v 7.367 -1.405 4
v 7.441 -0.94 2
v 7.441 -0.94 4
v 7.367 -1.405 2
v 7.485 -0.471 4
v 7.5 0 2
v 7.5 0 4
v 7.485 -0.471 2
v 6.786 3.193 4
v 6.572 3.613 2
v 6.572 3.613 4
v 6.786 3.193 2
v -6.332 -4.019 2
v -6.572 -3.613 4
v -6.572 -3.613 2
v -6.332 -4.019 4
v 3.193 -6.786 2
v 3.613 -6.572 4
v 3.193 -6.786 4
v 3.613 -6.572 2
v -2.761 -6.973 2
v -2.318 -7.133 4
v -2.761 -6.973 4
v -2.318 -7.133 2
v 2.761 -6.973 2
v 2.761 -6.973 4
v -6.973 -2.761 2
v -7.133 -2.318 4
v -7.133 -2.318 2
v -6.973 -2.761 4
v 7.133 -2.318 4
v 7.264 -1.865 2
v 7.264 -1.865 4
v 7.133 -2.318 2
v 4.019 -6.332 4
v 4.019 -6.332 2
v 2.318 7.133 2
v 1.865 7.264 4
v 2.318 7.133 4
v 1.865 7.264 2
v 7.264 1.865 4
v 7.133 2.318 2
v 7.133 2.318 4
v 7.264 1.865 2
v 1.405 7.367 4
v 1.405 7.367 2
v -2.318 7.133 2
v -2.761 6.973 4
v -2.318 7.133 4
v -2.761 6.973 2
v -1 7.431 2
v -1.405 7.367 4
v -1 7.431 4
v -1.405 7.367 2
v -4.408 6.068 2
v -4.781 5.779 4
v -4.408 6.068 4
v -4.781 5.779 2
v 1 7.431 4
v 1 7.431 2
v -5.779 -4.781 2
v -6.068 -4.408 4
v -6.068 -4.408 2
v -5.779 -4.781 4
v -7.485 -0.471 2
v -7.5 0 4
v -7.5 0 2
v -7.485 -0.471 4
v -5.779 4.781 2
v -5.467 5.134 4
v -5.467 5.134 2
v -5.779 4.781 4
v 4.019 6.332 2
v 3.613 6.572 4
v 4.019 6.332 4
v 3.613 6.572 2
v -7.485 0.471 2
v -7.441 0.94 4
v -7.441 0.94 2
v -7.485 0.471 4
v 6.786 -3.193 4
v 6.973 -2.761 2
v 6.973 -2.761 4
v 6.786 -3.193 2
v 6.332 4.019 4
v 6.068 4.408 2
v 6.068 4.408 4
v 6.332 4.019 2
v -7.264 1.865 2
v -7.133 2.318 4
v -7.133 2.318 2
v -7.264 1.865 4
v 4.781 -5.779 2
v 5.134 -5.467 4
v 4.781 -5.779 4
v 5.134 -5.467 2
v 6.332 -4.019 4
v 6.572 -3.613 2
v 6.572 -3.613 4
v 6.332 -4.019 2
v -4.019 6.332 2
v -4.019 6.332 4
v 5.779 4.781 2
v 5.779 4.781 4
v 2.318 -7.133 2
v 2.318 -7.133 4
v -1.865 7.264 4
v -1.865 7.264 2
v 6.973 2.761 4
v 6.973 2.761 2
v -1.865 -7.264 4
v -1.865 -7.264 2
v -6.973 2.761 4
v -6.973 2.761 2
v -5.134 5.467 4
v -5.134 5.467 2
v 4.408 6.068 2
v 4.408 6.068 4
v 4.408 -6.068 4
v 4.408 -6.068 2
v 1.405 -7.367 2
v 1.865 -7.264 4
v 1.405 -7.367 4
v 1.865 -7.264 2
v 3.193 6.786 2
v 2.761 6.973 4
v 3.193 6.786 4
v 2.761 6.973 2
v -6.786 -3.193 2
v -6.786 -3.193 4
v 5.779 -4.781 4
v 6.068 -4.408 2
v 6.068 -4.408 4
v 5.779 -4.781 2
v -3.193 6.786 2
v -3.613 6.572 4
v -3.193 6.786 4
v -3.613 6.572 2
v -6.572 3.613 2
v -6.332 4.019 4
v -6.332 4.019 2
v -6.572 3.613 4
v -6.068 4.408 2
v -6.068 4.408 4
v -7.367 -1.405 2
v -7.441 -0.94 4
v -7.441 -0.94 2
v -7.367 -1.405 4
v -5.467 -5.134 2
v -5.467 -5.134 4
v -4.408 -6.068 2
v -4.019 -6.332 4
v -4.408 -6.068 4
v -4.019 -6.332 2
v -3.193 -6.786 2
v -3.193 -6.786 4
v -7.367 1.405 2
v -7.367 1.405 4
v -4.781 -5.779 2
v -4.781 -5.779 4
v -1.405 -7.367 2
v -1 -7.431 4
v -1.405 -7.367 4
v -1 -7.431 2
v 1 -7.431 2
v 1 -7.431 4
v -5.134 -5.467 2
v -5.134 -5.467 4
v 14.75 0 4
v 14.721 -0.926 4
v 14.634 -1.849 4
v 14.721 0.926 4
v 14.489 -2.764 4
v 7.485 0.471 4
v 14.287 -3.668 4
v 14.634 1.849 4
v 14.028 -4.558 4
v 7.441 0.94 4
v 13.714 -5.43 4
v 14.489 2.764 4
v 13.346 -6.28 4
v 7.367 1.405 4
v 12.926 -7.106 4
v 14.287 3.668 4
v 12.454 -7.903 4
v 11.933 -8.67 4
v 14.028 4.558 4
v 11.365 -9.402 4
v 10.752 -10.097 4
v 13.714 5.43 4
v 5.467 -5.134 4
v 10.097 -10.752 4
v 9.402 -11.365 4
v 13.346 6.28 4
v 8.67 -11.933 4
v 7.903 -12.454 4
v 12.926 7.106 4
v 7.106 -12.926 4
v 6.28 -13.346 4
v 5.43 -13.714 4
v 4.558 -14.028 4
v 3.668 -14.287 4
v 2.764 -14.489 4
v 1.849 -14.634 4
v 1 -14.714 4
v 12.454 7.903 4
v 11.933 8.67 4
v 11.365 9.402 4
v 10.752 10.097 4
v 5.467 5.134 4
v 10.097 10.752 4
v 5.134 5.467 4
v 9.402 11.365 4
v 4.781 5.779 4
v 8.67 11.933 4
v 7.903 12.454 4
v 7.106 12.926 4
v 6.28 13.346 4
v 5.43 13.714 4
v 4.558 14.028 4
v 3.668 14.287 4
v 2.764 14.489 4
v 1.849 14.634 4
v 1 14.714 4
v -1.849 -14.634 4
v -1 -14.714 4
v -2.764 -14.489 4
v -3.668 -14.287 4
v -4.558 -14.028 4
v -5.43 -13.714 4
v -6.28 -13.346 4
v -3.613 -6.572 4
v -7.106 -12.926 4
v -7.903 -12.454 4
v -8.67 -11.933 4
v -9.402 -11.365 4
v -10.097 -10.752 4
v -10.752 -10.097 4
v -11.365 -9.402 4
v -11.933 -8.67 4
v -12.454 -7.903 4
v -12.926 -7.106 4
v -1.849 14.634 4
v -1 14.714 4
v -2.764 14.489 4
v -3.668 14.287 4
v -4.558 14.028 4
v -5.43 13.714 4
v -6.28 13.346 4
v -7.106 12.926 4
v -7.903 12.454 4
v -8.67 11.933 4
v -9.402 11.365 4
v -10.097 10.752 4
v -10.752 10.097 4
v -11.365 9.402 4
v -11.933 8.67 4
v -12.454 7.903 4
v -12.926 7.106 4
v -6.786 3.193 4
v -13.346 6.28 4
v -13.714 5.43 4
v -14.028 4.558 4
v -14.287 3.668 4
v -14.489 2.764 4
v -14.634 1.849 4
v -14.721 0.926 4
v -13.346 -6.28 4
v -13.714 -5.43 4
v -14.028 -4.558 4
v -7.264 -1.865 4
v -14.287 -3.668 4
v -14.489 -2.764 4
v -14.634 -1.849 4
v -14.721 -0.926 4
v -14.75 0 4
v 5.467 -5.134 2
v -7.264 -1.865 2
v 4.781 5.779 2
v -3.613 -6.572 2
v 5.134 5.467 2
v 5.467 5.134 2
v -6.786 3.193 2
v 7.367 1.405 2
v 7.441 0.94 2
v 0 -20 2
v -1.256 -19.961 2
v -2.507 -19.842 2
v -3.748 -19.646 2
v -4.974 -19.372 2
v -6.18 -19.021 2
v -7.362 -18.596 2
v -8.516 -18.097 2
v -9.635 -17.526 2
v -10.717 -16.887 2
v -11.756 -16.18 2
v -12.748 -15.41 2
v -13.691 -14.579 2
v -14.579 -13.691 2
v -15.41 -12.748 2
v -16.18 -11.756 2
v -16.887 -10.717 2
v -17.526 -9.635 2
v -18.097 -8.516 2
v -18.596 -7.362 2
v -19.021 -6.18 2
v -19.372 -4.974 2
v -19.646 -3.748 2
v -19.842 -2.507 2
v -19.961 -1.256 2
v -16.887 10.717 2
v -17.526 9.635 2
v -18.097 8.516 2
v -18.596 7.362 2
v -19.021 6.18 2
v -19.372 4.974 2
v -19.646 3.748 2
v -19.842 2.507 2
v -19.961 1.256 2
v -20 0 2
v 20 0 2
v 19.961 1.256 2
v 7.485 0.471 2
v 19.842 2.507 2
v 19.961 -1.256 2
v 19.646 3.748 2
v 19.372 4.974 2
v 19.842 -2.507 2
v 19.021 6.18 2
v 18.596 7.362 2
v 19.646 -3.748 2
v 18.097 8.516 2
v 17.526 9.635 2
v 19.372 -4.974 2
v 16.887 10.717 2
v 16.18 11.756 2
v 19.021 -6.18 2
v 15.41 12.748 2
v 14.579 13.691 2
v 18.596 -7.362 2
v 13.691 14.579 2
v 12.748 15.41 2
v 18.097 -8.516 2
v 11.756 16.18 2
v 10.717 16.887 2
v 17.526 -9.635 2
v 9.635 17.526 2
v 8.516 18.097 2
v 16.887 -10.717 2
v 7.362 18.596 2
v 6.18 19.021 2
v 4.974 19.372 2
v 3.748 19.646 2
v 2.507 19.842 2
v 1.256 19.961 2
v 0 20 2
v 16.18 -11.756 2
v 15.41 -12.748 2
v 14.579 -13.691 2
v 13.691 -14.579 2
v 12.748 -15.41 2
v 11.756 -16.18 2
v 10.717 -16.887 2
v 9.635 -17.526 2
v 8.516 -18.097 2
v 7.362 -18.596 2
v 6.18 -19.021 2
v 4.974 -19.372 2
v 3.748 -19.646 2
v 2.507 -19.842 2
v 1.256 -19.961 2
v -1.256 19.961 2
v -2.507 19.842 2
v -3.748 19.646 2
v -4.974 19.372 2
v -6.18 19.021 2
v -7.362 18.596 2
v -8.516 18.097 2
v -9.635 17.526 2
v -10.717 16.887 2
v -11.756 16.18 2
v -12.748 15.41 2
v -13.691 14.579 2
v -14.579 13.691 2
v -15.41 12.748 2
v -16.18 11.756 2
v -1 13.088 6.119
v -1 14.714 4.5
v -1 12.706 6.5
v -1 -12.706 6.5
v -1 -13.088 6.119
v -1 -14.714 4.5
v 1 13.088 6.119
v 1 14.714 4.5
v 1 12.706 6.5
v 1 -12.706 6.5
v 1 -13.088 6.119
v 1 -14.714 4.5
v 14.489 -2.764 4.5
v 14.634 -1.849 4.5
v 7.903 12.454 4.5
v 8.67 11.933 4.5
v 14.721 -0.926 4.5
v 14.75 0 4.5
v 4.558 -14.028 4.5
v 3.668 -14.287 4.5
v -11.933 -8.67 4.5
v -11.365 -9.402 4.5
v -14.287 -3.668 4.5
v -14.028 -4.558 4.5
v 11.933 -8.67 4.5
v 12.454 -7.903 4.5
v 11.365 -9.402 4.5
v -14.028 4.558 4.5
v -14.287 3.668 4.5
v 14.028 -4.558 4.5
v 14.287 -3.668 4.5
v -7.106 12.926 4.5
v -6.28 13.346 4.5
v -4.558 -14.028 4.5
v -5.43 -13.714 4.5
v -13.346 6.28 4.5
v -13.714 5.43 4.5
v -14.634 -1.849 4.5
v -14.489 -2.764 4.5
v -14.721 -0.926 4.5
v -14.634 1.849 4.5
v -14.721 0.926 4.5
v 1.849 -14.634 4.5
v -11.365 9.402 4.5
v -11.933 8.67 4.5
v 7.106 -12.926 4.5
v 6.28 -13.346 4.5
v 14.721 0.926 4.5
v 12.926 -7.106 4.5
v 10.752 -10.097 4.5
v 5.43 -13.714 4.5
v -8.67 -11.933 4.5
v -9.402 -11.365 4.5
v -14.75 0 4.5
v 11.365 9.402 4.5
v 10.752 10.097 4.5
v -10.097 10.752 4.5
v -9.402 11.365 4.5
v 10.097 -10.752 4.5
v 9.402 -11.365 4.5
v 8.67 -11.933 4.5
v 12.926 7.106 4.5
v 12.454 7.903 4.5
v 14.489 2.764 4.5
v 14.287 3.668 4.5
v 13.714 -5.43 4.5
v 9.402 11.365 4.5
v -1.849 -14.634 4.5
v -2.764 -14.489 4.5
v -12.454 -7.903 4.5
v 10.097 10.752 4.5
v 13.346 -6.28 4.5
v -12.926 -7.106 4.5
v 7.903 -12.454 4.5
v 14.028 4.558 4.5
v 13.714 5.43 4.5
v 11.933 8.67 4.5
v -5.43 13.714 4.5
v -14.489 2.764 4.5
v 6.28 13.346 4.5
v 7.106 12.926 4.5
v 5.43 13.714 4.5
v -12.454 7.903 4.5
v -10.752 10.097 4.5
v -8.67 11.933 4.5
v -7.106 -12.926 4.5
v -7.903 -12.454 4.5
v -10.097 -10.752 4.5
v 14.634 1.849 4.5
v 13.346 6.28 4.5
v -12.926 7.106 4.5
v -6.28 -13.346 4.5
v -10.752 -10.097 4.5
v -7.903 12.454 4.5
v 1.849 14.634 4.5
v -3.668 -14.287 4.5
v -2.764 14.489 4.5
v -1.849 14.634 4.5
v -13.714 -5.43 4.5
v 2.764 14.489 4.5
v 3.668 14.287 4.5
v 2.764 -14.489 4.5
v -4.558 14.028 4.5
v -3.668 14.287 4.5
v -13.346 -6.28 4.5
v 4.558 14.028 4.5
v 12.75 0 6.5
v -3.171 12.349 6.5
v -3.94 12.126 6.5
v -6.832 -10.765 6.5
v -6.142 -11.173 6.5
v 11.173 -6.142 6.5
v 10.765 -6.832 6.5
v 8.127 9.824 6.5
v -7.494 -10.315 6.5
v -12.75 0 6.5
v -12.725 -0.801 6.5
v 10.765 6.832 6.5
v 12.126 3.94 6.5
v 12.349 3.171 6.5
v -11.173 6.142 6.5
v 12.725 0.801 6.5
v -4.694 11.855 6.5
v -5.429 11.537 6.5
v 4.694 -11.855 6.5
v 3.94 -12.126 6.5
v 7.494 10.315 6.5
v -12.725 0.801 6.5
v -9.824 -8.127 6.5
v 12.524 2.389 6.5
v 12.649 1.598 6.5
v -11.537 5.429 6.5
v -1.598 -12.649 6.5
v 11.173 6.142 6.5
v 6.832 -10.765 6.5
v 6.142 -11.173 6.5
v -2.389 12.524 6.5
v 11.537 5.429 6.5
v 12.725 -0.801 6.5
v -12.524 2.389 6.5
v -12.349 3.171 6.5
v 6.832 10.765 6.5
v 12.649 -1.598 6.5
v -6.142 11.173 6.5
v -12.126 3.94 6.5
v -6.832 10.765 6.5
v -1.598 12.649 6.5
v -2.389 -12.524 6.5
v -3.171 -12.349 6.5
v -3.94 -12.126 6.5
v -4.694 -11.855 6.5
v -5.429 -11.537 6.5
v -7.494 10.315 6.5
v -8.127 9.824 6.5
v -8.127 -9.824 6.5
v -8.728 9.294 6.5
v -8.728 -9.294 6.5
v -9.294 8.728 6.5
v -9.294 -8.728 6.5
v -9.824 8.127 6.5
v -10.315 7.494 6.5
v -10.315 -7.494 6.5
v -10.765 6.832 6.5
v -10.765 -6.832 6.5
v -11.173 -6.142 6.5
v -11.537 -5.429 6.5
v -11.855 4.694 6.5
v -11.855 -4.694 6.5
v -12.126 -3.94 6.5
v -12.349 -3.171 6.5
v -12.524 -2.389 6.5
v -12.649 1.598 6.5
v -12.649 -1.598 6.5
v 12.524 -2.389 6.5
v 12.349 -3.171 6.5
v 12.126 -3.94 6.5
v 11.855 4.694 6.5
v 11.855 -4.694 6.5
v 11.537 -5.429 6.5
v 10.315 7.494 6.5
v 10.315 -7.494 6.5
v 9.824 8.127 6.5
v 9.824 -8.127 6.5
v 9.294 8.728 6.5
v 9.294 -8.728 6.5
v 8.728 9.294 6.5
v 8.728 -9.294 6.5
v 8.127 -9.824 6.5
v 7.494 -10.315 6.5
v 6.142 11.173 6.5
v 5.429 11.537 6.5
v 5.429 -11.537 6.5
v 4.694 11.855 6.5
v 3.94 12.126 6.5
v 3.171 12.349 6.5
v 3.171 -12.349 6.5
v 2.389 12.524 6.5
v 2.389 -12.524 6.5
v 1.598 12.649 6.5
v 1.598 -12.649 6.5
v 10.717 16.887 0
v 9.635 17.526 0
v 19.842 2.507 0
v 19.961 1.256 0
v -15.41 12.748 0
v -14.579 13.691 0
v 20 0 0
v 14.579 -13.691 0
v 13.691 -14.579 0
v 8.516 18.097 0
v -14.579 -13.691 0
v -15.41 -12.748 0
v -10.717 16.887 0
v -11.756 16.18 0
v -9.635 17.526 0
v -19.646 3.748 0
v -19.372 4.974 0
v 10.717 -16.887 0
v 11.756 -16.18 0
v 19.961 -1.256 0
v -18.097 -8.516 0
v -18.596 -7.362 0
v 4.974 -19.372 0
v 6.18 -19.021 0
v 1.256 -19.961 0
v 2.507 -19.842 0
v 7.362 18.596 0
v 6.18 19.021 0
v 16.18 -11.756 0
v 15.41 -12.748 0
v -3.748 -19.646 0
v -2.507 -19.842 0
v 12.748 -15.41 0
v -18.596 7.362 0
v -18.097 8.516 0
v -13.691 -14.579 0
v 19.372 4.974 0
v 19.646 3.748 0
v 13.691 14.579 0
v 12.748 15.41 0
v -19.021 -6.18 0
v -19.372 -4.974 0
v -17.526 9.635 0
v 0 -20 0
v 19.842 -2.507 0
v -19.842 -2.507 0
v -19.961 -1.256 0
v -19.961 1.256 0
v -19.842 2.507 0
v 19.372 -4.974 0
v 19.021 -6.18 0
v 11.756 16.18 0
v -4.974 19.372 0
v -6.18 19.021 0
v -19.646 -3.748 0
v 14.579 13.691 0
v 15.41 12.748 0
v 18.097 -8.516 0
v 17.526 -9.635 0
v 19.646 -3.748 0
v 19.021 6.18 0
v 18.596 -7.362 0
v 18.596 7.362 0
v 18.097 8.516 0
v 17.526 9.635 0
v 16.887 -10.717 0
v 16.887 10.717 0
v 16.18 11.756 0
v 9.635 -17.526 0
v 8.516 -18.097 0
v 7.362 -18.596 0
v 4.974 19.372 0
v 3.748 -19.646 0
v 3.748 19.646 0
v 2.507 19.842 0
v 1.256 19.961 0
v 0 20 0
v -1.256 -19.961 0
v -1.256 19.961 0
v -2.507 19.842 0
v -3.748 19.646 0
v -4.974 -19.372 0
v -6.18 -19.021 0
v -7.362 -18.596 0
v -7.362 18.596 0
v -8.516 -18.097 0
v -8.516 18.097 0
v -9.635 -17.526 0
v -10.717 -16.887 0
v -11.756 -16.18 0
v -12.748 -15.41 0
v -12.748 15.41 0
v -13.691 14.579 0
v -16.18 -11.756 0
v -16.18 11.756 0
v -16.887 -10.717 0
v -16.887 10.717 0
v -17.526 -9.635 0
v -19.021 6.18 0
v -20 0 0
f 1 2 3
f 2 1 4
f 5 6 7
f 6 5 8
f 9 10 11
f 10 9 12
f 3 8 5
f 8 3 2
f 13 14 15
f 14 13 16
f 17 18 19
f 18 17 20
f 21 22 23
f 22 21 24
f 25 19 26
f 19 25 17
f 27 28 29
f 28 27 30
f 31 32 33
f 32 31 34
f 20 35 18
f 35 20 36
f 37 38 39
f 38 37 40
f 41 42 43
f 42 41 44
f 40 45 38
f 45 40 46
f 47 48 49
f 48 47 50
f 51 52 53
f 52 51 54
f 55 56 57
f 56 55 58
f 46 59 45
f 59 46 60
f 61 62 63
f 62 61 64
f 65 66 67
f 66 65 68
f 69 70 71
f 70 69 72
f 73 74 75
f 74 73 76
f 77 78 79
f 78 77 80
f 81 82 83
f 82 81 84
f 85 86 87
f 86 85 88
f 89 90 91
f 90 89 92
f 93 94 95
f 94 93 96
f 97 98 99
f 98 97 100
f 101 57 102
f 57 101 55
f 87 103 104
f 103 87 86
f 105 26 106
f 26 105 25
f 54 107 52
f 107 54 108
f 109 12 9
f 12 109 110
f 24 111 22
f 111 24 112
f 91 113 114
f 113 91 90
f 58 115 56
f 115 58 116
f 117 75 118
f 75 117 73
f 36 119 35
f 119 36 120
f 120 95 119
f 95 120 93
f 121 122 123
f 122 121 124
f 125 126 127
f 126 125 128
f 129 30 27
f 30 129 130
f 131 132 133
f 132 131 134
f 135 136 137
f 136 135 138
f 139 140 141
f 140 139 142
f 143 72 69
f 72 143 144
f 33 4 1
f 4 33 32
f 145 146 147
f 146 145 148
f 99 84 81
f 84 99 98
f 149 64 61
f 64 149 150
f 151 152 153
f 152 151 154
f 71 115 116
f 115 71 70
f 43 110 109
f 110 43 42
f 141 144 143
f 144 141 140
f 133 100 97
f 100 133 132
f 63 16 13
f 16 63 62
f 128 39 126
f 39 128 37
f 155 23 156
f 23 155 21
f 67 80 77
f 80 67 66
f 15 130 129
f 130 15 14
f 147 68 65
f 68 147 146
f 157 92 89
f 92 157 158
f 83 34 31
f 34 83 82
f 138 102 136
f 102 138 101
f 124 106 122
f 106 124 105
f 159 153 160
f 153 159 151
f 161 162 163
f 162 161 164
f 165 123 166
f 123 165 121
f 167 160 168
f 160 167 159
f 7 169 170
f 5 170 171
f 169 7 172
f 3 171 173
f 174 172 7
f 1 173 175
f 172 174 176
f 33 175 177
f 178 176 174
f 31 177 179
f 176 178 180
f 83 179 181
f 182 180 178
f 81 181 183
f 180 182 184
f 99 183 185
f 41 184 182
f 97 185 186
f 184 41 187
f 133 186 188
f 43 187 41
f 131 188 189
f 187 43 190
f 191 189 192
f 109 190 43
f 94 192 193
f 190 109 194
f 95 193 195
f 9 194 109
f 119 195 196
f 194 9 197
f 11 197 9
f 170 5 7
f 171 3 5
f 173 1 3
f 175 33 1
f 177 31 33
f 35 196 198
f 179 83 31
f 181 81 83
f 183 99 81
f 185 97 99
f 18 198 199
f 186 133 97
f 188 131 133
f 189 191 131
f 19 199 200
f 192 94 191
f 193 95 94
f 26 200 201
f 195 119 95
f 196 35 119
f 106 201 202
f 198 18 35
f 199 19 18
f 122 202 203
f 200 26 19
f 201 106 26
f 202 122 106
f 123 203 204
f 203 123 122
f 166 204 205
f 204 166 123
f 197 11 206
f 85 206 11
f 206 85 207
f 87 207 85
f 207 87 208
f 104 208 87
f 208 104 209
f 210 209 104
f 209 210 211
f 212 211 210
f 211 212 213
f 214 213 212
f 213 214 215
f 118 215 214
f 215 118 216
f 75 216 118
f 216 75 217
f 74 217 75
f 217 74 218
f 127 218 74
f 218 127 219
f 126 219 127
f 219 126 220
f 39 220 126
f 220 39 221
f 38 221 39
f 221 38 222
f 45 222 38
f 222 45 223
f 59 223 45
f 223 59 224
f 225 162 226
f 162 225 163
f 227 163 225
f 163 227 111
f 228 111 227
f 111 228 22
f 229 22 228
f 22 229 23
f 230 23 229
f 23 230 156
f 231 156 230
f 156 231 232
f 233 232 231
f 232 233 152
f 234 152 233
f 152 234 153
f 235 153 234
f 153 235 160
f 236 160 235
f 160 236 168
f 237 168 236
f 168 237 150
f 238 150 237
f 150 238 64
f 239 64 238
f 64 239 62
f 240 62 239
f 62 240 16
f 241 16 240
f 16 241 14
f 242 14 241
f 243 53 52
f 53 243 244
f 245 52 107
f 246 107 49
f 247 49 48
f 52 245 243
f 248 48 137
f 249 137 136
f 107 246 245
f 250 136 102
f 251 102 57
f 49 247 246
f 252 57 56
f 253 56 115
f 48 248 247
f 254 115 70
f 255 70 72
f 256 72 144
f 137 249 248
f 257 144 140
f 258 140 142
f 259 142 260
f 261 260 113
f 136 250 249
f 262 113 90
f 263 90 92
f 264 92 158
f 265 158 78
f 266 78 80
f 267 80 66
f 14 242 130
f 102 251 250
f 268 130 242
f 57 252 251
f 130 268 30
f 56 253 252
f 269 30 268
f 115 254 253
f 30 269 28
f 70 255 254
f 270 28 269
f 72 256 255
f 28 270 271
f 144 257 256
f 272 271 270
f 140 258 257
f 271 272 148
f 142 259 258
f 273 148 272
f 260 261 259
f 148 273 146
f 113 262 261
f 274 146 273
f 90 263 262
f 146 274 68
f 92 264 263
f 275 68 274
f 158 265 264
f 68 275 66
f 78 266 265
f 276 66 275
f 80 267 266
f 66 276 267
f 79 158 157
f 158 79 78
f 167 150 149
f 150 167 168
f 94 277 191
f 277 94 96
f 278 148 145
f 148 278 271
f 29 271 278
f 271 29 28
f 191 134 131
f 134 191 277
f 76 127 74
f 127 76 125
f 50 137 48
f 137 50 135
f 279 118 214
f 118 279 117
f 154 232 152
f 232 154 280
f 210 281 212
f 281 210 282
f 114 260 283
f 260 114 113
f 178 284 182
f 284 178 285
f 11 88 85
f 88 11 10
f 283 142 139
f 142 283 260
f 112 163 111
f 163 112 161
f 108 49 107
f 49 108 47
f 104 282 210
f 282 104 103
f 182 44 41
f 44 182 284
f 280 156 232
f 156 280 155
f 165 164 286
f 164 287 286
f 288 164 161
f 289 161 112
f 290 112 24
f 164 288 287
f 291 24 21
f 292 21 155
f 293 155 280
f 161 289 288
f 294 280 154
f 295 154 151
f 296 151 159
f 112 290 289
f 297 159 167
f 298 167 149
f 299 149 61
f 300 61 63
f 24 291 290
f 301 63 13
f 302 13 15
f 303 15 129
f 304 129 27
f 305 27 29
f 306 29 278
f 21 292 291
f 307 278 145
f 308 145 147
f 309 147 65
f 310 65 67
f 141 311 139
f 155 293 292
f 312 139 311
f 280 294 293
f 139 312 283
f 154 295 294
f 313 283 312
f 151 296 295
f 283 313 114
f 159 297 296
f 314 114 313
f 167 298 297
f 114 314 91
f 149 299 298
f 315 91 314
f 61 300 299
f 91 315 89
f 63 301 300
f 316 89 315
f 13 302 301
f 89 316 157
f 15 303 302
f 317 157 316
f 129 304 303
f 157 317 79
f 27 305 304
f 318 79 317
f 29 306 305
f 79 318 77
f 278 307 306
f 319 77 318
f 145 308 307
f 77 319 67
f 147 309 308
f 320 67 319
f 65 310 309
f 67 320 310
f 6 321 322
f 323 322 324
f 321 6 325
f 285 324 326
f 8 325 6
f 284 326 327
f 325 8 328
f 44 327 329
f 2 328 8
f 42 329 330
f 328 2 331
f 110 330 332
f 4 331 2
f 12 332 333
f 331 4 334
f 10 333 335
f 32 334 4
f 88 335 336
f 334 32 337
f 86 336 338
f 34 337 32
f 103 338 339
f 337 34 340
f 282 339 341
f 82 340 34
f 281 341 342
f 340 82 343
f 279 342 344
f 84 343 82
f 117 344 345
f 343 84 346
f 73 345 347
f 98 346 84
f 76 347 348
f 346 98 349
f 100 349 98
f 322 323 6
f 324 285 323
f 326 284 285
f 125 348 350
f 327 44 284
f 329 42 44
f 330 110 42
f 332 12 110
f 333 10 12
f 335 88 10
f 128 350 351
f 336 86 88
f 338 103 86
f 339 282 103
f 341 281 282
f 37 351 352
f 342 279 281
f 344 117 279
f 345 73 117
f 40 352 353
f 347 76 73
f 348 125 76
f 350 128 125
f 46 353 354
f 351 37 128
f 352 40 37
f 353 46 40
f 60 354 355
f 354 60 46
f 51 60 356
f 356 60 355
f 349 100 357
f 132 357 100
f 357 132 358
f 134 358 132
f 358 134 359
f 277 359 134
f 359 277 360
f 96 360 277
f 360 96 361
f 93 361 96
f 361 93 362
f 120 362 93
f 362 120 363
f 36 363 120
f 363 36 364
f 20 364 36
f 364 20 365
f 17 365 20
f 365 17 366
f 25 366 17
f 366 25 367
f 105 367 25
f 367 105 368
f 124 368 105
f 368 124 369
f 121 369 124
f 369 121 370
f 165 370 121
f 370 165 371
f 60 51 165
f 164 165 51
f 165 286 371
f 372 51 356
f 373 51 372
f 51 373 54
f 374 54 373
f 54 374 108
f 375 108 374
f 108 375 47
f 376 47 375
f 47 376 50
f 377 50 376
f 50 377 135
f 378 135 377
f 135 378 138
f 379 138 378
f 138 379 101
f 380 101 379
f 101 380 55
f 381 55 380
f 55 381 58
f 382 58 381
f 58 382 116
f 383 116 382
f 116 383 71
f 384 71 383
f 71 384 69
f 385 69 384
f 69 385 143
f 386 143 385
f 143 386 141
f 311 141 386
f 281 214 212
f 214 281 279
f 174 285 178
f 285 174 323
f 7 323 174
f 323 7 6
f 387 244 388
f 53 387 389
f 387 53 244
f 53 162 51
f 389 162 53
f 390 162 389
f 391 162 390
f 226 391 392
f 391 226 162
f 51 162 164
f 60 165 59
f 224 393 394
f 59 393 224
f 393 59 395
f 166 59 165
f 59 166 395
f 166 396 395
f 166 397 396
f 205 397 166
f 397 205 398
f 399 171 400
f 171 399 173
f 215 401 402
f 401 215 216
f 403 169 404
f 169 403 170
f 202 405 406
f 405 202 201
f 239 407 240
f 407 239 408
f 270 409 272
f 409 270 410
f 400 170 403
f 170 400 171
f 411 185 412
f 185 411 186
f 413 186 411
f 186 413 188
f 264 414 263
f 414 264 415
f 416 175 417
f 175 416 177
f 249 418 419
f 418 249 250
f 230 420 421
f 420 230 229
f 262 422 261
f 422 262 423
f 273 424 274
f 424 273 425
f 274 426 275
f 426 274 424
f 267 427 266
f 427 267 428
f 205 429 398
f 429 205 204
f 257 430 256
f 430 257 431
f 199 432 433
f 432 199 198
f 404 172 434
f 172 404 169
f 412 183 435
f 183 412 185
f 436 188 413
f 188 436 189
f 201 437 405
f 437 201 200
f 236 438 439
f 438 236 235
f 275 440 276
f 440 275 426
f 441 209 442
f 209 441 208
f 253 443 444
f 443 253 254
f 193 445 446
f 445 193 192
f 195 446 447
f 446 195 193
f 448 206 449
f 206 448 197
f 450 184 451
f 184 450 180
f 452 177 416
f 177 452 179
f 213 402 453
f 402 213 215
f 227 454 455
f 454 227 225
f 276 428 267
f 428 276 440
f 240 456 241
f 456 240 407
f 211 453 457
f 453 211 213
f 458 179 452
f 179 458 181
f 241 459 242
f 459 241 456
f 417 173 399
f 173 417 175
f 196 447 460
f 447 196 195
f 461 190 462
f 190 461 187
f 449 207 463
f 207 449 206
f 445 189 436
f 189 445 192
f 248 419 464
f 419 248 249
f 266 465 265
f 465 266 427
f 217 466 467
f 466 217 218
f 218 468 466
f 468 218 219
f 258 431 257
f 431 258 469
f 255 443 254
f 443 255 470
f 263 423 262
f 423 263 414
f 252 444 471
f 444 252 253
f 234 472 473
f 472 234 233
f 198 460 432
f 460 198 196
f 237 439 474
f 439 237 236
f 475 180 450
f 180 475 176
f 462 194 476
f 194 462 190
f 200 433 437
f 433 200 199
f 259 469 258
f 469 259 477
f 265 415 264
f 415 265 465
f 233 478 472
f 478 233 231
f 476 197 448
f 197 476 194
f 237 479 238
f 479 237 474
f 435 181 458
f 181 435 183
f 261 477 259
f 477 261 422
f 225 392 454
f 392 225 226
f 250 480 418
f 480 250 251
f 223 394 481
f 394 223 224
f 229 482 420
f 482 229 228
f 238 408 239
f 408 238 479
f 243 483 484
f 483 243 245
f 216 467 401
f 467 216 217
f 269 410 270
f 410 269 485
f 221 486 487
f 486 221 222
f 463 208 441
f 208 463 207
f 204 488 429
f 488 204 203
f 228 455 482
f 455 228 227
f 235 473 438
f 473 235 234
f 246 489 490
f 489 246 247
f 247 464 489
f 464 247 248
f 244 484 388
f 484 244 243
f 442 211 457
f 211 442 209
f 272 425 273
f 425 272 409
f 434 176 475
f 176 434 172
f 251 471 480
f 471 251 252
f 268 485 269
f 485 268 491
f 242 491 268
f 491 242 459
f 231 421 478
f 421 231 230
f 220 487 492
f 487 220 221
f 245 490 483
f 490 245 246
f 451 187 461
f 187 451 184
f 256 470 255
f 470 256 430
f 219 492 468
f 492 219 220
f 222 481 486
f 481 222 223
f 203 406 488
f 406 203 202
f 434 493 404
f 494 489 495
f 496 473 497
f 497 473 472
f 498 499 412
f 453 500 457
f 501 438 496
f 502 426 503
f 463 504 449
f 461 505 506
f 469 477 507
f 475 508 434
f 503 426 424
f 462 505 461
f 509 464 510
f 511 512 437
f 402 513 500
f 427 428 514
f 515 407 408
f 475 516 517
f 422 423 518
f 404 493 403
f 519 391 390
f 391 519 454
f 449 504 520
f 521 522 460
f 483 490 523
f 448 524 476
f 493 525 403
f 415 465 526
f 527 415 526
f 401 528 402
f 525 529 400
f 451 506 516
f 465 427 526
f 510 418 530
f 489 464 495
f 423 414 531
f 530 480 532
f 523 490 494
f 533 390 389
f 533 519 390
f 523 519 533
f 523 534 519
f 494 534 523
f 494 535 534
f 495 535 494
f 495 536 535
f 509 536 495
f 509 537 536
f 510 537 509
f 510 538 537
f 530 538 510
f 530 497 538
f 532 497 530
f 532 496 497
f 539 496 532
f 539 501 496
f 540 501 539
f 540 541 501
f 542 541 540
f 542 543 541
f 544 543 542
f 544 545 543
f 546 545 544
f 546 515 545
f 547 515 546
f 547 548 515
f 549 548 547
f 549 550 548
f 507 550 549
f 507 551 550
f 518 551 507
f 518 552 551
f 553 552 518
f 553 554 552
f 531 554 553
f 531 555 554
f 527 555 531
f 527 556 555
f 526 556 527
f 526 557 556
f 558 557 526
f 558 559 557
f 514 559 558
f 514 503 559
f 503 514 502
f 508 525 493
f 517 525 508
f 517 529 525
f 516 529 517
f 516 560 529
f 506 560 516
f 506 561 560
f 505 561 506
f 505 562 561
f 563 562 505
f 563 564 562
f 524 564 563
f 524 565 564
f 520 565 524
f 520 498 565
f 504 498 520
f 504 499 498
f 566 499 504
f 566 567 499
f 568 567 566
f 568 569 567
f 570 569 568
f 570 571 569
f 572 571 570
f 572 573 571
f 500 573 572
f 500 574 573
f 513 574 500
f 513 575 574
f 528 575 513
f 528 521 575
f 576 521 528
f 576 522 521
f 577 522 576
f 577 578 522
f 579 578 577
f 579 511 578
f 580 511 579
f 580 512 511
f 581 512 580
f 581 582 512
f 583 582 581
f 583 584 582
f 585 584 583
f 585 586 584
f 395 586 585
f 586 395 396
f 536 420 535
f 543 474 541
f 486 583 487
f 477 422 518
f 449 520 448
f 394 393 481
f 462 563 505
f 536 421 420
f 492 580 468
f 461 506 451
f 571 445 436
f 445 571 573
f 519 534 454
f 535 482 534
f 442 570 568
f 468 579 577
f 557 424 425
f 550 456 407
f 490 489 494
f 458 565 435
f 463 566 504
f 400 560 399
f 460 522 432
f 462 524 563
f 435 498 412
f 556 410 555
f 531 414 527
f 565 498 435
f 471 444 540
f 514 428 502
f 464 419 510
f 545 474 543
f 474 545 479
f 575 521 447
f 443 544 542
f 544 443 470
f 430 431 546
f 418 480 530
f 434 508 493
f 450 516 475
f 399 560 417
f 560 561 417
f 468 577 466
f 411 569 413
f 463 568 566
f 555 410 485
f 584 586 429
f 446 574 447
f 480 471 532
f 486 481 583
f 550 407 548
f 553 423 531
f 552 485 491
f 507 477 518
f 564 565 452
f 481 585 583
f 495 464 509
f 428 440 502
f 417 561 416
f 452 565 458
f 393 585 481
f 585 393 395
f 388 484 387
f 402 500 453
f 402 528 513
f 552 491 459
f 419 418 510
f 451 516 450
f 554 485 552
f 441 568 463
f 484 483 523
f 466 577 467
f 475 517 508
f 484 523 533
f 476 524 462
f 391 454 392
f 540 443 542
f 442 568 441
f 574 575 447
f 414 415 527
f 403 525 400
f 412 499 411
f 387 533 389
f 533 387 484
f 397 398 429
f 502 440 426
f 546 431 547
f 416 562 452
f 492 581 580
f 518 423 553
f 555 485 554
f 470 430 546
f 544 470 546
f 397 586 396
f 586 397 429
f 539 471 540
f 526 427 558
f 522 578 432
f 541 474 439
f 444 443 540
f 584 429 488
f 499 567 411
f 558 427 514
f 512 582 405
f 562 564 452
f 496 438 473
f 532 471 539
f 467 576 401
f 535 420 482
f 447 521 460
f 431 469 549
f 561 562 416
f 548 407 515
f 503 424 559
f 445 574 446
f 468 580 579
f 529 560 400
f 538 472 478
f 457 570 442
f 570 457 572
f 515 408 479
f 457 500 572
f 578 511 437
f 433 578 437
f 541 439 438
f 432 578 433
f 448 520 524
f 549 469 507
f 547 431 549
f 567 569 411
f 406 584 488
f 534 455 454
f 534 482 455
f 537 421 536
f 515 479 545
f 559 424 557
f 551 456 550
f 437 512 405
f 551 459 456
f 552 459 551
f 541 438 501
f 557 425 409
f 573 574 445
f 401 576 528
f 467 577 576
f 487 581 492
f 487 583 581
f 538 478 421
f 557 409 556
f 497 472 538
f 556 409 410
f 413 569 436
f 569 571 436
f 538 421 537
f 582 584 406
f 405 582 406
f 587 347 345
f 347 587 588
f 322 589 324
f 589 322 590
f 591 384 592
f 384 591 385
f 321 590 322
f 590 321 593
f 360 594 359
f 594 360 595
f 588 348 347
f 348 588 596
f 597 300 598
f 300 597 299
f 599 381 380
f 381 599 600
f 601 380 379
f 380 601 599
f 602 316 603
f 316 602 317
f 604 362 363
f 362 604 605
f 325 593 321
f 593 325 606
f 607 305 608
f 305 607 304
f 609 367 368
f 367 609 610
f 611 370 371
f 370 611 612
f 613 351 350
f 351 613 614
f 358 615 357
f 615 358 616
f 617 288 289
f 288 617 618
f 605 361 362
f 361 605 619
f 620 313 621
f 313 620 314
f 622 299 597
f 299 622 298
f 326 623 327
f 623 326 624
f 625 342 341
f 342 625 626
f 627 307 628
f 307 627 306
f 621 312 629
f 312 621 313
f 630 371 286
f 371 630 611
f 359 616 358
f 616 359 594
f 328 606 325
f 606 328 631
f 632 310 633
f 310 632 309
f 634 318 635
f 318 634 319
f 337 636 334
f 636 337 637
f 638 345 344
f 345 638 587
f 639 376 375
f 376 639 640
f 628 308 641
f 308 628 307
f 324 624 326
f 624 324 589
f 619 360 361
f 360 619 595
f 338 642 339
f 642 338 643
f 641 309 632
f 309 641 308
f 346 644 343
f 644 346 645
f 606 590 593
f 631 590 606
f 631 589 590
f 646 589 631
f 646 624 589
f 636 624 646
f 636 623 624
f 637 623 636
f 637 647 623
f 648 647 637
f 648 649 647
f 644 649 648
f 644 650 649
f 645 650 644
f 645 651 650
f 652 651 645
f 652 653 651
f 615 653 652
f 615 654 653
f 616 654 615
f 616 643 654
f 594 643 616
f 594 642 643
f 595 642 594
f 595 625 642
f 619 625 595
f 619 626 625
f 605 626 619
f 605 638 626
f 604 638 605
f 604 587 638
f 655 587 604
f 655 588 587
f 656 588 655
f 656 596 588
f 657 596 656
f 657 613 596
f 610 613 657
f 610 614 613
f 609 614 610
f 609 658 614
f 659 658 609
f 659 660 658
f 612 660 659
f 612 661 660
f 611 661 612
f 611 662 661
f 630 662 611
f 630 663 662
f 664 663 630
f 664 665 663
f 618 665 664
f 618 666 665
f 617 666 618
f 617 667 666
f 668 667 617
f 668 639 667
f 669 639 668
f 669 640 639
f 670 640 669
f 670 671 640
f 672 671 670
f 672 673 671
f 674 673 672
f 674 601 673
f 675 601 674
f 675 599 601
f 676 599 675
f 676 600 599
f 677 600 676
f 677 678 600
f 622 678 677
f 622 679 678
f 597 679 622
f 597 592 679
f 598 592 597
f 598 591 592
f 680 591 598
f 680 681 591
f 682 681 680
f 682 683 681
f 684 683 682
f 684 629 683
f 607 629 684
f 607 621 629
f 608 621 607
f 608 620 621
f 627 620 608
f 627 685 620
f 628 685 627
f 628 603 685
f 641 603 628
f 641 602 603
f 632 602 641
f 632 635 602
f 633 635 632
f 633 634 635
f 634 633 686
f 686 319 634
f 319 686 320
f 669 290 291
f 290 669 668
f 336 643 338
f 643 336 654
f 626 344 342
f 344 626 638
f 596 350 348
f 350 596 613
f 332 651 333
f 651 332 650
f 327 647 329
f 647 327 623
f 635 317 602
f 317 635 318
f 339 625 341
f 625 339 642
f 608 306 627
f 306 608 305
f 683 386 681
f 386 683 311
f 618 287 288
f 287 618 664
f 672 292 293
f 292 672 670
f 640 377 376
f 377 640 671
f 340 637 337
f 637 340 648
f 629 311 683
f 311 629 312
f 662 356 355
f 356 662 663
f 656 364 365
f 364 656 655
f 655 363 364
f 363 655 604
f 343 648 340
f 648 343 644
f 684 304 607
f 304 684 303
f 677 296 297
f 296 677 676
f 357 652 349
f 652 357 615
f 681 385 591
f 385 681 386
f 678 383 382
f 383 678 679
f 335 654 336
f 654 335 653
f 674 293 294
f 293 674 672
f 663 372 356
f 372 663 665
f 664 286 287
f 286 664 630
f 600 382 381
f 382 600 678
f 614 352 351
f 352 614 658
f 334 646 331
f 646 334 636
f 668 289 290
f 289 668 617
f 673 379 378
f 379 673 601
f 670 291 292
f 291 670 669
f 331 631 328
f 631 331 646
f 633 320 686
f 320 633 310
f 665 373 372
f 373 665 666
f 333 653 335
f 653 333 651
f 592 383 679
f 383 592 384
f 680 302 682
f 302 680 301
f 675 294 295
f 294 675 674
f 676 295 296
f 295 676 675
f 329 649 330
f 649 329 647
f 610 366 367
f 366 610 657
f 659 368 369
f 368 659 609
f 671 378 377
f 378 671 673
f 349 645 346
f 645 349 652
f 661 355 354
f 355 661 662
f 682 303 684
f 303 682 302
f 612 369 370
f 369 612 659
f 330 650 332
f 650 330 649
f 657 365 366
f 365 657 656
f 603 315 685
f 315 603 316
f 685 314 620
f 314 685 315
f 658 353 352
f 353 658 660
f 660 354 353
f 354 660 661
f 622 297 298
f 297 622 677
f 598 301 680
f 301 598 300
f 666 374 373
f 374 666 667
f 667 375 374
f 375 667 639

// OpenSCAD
//Diameter of pin bottom
baseDiam = 40; 
//Diameter of pin inner cylinder 
innerDiam = 15; 

//Thickness of pin bottom
baseHeight = 2; 
//Length of inner cylinder
innerHeight = 2; 

//Diameter of hook
hookDiam = innerDiam + 14.5; 

//Height of hook 
hookHeight = 2; 

//Width of inner slot
innerWidth = 2; 

//Angle of chamfer
chamferAngle = 45; 

//Overall width of pin
pinWidth = 30; 

//Make double sided?
doubleSided = "no"; //[no,yes] 

module pinSection(diam, height, trans){
    translate([0,0,trans])
        linear_extrude(height = height, center = false, convexity = 10, twist = 0)
        circle(d=diam);
}

module hookSection(diam, height, trans, angle){
    topDiam = diam/2 - (height/tan(angle));
    pinSection(diam, 0.5, trans);
    translate([0,0,trans+0.5])
    cylinder(height, diam/2, topDiam, center = false);
}

module slotCut(trans, height, width){
    translate([0,0,trans])
    linear_extrude(height = height+1, center = false, convexity = 10, twist = 0)
    square([width,baseDiam], center = true);
}

module sideCut(thickness, height, width){
    translate([0,thickness,0])
    linear_extrude(height = height, center = false, convexity = 10, twist = 0)
    square([width,width], center = false);
}

module pin($fn = 100){
    pinSection(baseDiam, baseHeight);

    difference(){
        pinSection(innerDiam, innerHeight, baseHeight);
        slotCut(baseHeight, innerHeight, innerWidth);
    }

    difference(){
        hookSection(hookDiam, hookHeight, innerHeight+baseHeight, chamferAngle);        
        slotCut(innerHeight+baseHeight, hookHeight, innerWidth);
    }
    
    
}

module generatePin(){
    difference(){
        pin();
        sideCut(pinWidth,innerHeight + baseHeight+hookHeight+1,baseDiam);
        mirror([1,0,0]) sideCut(pinWidth,innerHeight + baseHeight+hookHeight+1,baseDiam);
        mirror([0,1,0]) sideCut(pinWidth,innerHeight + baseHeight+hookHeight+1,baseDiam);
        mirror([0,1,0]) mirror([1,0,0]) sideCut(pinWidth,innerHeight + baseHeight+hookHeight+1,baseDiam);
    }
}


if(doubleSided == "yes"){
    generatePin();
    mirror([0,0,-1]) generatePin();
}
else{
    generatePin();
}
